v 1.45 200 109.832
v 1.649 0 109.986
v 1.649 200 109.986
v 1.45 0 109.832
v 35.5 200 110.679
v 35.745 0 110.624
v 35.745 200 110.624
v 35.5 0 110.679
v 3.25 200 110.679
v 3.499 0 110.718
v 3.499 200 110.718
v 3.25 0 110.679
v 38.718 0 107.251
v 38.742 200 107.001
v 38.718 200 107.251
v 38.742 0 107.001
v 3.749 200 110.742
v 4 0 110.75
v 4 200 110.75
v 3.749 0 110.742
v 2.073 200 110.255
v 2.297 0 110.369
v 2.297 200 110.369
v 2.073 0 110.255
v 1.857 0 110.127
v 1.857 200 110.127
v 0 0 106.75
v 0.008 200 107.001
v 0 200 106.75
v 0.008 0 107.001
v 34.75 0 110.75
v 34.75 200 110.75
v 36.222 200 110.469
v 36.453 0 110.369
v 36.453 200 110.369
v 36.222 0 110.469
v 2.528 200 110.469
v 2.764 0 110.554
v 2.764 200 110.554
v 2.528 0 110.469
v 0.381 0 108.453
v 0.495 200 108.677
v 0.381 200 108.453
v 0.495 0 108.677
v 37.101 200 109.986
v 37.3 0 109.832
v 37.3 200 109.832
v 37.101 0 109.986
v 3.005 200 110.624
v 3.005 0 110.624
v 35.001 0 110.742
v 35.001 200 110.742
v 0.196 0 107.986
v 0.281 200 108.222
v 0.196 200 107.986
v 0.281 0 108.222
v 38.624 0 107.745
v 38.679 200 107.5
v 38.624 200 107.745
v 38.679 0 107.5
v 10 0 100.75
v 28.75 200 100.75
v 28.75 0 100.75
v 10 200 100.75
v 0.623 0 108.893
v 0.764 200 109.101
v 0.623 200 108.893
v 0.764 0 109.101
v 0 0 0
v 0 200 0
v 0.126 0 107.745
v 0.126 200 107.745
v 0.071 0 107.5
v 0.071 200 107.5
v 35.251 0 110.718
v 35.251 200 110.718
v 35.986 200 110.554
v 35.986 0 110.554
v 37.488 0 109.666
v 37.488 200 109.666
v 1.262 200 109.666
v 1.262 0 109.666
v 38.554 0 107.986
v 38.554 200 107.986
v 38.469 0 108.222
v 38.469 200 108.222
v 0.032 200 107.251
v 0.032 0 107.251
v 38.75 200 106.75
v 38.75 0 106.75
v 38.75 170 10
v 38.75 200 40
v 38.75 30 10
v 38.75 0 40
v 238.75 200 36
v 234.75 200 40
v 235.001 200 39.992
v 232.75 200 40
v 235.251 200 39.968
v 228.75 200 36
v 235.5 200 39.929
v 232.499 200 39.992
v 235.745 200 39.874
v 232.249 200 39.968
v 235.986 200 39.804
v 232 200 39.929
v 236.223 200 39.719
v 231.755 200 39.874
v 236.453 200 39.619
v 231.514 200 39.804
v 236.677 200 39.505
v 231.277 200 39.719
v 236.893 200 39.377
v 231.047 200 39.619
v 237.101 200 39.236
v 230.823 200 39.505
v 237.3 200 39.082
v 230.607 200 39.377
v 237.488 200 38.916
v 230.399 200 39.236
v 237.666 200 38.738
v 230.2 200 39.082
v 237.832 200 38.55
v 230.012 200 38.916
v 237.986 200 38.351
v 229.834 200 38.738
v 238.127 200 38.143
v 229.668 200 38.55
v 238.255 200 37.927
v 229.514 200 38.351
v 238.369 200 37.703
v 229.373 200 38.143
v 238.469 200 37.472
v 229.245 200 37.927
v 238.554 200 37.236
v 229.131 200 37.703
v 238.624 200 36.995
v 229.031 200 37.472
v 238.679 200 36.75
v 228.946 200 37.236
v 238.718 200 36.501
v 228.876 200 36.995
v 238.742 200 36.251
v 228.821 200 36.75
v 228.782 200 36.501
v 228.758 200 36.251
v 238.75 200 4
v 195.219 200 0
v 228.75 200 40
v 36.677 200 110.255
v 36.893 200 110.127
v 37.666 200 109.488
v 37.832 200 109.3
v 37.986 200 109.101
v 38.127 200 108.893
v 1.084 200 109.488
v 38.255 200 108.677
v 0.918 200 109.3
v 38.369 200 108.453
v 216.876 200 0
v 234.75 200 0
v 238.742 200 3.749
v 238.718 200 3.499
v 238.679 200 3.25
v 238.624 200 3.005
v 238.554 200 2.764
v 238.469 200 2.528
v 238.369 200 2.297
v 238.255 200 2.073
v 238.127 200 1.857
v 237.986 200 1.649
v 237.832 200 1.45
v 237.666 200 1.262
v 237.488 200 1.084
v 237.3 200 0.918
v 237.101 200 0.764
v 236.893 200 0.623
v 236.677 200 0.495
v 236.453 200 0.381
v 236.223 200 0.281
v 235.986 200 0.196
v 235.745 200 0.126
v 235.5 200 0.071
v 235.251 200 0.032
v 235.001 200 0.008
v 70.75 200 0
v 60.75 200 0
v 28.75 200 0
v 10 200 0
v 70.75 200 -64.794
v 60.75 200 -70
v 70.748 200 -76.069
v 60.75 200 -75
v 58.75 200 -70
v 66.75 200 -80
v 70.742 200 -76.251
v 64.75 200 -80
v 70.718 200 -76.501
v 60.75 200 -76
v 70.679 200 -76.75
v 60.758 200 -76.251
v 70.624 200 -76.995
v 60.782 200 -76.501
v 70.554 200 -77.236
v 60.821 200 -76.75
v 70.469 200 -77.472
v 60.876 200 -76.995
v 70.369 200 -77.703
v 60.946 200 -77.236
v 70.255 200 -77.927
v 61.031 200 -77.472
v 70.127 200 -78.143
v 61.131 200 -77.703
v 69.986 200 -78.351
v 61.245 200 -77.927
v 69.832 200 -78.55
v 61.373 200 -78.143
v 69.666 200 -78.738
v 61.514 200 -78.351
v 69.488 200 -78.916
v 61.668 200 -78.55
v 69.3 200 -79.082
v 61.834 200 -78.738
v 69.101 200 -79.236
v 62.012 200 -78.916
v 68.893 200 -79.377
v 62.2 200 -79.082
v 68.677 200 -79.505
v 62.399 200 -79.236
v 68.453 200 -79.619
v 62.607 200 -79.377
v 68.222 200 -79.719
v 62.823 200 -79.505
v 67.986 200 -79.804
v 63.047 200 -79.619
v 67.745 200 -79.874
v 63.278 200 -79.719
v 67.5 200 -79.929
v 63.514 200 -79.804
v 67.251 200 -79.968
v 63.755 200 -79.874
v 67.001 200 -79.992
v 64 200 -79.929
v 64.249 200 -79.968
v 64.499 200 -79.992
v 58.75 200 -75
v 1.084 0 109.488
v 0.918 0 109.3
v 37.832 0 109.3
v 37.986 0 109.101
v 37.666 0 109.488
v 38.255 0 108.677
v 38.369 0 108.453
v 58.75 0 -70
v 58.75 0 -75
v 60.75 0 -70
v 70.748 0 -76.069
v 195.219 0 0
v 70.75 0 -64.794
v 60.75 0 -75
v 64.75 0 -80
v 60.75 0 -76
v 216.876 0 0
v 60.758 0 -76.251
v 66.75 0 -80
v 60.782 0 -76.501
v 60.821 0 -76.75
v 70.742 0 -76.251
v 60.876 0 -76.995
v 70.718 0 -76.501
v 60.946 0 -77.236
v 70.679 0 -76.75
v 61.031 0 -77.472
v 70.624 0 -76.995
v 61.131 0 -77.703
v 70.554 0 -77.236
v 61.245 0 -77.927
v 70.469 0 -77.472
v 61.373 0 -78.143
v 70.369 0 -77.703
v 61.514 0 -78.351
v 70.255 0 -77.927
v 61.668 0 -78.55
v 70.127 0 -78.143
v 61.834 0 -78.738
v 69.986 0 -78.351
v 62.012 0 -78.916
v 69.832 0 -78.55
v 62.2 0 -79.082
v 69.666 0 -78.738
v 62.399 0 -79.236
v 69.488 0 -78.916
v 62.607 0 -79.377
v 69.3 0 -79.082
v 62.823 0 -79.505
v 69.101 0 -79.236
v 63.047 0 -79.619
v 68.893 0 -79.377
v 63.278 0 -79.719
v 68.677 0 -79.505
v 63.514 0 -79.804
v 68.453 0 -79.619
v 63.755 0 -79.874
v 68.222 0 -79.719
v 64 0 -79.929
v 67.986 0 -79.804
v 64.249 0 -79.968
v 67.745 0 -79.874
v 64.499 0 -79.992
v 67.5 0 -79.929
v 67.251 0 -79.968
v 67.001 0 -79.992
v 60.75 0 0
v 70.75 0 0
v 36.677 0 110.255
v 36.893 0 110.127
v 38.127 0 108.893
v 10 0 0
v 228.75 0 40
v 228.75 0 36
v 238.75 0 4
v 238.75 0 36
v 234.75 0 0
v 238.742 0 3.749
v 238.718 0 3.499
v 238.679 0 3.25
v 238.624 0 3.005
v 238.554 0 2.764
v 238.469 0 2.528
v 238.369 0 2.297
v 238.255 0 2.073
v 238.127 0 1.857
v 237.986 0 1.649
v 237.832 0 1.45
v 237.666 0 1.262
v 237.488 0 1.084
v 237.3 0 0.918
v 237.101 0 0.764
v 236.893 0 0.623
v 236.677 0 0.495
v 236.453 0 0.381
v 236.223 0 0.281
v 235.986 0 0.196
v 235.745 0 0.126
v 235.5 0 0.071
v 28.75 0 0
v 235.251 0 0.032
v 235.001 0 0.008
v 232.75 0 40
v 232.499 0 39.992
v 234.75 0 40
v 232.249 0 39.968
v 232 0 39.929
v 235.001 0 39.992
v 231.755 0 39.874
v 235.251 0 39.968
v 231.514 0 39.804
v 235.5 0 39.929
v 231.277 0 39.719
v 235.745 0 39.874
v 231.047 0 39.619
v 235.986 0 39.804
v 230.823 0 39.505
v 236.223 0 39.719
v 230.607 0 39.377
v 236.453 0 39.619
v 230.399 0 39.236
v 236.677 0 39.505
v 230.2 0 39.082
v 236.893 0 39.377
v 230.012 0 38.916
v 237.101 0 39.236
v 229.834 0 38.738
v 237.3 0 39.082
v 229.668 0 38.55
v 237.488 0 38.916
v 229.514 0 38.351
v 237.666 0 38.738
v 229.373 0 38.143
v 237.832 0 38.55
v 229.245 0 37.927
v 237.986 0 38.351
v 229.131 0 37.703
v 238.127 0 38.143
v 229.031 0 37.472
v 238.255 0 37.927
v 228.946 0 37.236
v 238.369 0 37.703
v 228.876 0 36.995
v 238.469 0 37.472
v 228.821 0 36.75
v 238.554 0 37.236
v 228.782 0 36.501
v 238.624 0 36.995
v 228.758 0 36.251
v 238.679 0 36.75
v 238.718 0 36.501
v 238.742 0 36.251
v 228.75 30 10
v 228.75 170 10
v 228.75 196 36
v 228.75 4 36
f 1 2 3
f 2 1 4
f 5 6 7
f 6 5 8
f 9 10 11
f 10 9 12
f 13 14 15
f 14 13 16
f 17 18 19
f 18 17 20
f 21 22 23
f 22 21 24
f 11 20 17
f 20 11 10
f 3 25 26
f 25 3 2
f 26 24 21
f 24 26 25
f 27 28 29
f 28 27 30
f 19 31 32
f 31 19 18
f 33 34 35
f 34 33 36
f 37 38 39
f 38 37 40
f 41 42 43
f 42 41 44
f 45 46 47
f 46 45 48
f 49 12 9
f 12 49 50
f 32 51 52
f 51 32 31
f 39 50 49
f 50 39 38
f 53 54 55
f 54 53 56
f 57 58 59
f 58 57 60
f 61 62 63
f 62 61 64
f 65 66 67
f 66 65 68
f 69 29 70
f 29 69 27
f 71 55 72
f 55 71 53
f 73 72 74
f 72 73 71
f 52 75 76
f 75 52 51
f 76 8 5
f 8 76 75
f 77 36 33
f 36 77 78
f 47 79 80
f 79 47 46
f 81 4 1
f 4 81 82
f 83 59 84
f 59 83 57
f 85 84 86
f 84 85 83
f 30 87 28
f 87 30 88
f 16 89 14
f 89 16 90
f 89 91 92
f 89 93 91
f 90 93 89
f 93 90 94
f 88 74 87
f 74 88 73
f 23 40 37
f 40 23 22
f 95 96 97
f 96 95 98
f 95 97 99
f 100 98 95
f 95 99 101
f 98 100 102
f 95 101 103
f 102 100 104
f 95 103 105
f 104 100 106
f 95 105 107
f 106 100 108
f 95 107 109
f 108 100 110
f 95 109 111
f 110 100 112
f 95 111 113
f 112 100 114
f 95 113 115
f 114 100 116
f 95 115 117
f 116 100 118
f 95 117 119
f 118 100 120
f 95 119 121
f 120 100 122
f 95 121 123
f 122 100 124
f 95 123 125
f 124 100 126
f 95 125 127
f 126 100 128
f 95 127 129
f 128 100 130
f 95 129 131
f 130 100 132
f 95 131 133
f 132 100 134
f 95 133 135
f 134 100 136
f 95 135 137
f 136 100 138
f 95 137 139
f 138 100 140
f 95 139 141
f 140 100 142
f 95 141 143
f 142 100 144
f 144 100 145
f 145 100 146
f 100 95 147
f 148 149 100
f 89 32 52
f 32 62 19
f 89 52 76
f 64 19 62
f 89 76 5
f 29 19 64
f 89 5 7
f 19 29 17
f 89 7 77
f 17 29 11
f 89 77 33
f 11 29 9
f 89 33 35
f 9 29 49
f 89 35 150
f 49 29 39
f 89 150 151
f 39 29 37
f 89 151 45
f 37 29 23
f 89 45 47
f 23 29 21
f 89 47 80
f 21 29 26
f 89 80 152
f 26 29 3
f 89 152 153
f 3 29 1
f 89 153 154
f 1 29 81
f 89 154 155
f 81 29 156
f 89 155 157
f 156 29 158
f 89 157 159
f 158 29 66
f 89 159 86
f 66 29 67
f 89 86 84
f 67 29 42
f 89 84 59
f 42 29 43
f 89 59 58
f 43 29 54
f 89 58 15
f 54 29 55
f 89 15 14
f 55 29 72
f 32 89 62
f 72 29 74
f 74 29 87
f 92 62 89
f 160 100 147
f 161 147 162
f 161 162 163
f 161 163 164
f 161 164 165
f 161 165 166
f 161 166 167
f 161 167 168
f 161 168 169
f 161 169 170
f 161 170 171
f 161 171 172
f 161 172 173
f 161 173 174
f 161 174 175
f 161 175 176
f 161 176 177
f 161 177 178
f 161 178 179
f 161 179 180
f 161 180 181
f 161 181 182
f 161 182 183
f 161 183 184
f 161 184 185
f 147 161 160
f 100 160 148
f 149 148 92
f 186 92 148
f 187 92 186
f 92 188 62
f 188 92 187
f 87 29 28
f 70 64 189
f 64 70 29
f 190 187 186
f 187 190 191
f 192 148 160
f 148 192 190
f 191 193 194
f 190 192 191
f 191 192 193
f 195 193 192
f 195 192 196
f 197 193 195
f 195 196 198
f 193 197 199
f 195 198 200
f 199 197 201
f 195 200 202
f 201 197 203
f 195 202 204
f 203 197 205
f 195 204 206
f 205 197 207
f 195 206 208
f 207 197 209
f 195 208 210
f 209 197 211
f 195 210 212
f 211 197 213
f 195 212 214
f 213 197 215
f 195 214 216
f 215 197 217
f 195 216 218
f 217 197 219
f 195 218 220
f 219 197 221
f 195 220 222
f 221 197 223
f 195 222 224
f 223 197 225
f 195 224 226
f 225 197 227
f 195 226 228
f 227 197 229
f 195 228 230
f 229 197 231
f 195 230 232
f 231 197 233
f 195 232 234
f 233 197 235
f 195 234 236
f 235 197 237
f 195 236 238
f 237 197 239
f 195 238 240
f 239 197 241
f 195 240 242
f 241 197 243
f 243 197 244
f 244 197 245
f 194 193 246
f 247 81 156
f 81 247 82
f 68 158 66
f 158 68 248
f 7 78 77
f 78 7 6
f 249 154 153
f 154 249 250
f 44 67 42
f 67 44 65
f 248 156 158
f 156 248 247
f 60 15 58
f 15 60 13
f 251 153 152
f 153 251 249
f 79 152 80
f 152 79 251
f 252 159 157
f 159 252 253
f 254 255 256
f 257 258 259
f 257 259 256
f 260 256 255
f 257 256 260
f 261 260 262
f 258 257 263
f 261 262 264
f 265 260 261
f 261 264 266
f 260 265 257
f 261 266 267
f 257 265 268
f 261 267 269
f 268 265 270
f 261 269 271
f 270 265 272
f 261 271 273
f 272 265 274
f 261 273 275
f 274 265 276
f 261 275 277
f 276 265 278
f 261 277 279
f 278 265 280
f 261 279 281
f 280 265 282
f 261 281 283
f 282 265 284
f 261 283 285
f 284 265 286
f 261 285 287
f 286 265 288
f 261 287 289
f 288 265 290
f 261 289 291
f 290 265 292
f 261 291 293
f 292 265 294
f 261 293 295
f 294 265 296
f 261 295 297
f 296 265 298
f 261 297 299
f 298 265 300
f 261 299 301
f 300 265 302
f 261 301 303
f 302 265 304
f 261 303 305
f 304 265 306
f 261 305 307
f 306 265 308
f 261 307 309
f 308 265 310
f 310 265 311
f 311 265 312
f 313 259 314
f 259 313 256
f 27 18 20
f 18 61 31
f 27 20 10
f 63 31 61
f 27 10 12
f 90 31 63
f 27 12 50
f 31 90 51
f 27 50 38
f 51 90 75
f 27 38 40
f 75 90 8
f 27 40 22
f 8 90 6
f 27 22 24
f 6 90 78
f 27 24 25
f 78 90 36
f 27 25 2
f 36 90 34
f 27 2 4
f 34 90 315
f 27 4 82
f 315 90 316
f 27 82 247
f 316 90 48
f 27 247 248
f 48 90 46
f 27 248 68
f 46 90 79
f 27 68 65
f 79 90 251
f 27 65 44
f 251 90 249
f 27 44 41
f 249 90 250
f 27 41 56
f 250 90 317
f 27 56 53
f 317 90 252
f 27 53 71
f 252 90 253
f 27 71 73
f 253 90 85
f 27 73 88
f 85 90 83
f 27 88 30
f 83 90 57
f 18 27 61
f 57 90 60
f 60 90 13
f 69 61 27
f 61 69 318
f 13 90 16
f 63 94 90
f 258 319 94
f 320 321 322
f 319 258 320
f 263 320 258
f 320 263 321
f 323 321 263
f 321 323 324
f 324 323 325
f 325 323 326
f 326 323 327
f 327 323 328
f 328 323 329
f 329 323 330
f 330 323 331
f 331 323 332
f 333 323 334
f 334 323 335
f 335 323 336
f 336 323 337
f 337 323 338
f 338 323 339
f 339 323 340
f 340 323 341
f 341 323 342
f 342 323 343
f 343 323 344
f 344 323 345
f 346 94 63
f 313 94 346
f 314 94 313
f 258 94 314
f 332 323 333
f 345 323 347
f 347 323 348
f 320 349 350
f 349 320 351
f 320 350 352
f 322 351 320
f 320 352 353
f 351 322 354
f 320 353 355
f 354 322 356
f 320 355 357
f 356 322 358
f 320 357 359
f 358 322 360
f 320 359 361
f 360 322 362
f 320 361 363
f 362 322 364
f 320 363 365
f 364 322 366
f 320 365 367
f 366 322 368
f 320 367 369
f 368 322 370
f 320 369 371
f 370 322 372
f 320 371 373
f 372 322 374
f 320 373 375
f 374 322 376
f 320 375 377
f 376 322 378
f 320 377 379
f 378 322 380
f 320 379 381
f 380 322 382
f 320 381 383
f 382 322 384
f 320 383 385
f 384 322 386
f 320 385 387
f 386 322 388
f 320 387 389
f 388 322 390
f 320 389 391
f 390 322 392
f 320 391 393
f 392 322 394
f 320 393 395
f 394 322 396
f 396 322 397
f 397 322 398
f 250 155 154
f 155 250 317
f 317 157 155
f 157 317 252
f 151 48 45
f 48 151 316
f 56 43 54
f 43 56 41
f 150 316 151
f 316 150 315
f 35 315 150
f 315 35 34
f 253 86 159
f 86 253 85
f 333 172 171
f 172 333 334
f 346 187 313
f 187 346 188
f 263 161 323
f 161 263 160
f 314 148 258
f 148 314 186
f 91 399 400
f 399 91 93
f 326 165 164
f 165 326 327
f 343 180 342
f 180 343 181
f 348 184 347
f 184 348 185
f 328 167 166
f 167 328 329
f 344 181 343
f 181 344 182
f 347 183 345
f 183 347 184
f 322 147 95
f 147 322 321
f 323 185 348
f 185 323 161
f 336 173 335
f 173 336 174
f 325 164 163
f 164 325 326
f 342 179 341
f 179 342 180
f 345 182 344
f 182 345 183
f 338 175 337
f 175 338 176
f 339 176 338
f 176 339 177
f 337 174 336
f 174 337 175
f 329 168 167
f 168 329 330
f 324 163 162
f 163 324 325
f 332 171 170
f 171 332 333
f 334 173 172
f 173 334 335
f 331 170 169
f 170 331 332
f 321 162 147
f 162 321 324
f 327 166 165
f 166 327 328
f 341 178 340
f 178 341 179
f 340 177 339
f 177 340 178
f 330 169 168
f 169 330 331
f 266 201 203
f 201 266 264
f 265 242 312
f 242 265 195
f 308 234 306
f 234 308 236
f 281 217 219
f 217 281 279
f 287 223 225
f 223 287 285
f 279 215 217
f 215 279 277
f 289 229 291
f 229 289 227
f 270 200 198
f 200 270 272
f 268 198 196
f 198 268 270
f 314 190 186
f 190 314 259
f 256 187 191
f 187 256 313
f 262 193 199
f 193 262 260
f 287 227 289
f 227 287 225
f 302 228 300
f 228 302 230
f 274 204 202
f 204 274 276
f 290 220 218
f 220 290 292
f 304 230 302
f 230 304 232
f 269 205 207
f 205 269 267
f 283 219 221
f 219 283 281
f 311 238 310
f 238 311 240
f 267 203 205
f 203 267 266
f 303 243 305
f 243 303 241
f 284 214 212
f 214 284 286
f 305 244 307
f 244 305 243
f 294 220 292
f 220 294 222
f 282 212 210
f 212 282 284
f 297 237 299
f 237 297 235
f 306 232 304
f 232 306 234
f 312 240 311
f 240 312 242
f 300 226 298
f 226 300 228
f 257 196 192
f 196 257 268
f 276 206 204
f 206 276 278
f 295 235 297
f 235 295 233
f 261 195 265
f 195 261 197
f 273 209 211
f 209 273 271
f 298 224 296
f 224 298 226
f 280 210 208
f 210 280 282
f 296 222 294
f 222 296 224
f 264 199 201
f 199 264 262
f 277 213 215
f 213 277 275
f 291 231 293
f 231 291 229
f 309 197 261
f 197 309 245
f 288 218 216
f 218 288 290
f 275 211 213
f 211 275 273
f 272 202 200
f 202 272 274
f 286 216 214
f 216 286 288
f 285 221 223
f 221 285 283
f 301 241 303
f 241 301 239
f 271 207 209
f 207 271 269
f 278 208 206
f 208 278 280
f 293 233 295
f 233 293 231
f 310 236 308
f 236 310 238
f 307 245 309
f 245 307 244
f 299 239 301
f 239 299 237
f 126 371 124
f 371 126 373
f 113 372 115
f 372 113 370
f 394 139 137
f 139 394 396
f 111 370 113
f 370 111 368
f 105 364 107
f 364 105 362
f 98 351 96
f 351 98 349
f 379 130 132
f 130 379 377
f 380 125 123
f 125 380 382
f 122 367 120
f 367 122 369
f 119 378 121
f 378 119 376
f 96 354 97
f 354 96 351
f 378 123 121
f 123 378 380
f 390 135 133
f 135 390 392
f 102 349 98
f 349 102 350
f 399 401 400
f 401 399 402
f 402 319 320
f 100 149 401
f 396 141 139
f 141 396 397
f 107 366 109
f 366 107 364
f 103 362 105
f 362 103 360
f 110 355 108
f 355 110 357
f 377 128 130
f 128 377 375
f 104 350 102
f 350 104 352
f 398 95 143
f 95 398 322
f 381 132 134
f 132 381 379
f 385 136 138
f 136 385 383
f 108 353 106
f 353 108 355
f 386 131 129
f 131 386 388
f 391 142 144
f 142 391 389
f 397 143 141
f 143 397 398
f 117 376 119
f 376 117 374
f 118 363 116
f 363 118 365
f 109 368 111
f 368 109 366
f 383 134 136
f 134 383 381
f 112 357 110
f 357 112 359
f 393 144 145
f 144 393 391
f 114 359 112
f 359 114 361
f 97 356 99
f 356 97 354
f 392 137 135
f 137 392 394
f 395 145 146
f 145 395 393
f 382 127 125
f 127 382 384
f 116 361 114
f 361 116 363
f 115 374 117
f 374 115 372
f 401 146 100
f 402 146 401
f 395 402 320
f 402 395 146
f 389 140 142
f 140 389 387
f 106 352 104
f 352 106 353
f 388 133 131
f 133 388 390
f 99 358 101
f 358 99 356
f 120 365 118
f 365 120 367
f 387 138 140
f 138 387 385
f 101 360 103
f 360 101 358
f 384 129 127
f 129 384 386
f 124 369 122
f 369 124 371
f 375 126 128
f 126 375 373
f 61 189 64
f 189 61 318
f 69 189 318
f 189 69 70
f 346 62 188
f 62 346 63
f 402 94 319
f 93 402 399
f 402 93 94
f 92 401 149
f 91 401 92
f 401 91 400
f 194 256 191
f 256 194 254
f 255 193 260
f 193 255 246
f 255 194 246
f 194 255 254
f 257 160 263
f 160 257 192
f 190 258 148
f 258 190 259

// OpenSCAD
$fn=100;

// Prusa i3 MK3S
maxBuildX = 250;
maxBuildY = 210;
maxBuildZ = 200;

barrierHeight = 100.75;
barrierWidth = 18.75;
sideWidth = 32;
lowerSideKnobWidth = 2;

bowlPlateWidth = 200;

handleWidth = (bowlPlateWidth*1.5 > maxBuildZ ? maxBuildZ : bowlPlateWidth*1.5);
handleStrength = 10;
handleSideHeight = bowlPlateWidth*0.4;
bowlWallHeight = handleStrength*3;

edgeSmoothness = 4;
cylinderHeight = 1;

$fn=100;

module roundCube(x=1, y=1, z=1, roundness=1, cylinderHeight=1) {
    translate([roundness,cylinderHeight,roundness]) minkowski() {
        color("red") cube([x-2*roundness, y-cylinderHeight, z-2*roundness]);
        rotate([90,0,0]) cylinder(r=roundness,h=cylinderHeight);
    }
}

module wedge(size = 15, height = 10, stretch = 1) {
    linear_extrude(height = height) polygon([[0,0],[0,size*stretch],[size,0]]);
}

cube([handleStrength, handleWidth, barrierHeight]);
color("pink") translate([0, 0, barrierHeight])
union() {
    x=barrierWidth+(2*handleStrength);
    y=handleWidth;
    z=handleStrength;
    roundCube(x, y, z, edgeSmoothness, cylinderHeight);
    cube([x, y, z/2]);
}

color("fuchsia") translate([barrierWidth+handleStrength, 0, 0]) cube([handleStrength, handleWidth, barrierHeight]);

color("red") union() {
    translate([barrierWidth+2*handleStrength,0,0]) roundCube(bowlPlateWidth, handleWidth, handleStrength, edgeSmoothness, cylinderHeight);
    translate([barrierWidth+2*handleStrength,0,0]) cube([bowlPlateWidth/2, handleWidth, handleStrength]);
    translate([barrierWidth+2*handleStrength,0,handleStrength/2]) cube([bowlPlateWidth, handleWidth, handleStrength/2]);
}

//translate([barrierWidth+handleStrength+bowlPlateWidth+handleStrength/2,0,handleStrength]) rotate([0,-90,0]) wedge(bowlWallHeight, bowlPlateWidth-handleStrength/2);
translate([barrierWidth+handleStrength+bowlPlateWidth,0,handleStrength]) rotate([0,-90,0]) wedge(bowlWallHeight, bowlPlateWidth-handleStrength);

//translate([barrierWidth+2*handleStrength,handleWidth,handleStrength]) rotate([180,-90,0]) wedge(bowlWallHeight, bowlPlateWidth-handleStrength/2);
translate([barrierWidth+2*handleStrength,handleWidth,handleStrength]) rotate([180,-90,0]) wedge(bowlWallHeight, bowlPlateWidth-handleStrength);


a = handleSideHeight;
b = bowlPlateWidth-(barrierWidth+sideWidth+2*handleStrength);
c = sqrt(pow(a,2)+pow(b,2));

color("aqua") union() {
    translate([barrierWidth+sideWidth+handleStrength,0,-handleSideHeight]) roundCube(handleStrength,handleWidth,handleSideHeight, edgeSmoothness, cylinderHeight);
    translate([barrierWidth+sideWidth+handleStrength,0,-handleSideHeight/2]) cube([handleStrength,handleWidth,handleSideHeight/2]);
}
translate([barrierWidth+sideWidth+handleStrength-lowerSideKnobWidth,0,-handleSideHeight+handleStrength/2]) cube([lowerSideKnobWidth,handleWidth,5]);
color("blue") translate([barrierWidth+sideWidth+handleStrength,0,-handleSideHeight+handleStrength]) rotate([0,62.5,0]) cube([handleStrength,handleWidth,c+2*handleStrength]);

union() { 
    translate([barrierWidth+handleStrength+bowlPlateWidth,0,handleStrength]) roundCube(handleStrength, handleWidth, bowlWallHeight, edgeSmoothness, cylinderHeight);
    //translate([barrierWidth+handleStrength+bowlPlateWidth,0,handleStrength]) cube([handleStrength/2, handleWidth, bowlWallHeight]);
    translate([barrierWidth+handleStrength+bowlPlateWidth,0,handleStrength]) cube([handleStrength, handleWidth, bowlWallHeight/2]);
}
